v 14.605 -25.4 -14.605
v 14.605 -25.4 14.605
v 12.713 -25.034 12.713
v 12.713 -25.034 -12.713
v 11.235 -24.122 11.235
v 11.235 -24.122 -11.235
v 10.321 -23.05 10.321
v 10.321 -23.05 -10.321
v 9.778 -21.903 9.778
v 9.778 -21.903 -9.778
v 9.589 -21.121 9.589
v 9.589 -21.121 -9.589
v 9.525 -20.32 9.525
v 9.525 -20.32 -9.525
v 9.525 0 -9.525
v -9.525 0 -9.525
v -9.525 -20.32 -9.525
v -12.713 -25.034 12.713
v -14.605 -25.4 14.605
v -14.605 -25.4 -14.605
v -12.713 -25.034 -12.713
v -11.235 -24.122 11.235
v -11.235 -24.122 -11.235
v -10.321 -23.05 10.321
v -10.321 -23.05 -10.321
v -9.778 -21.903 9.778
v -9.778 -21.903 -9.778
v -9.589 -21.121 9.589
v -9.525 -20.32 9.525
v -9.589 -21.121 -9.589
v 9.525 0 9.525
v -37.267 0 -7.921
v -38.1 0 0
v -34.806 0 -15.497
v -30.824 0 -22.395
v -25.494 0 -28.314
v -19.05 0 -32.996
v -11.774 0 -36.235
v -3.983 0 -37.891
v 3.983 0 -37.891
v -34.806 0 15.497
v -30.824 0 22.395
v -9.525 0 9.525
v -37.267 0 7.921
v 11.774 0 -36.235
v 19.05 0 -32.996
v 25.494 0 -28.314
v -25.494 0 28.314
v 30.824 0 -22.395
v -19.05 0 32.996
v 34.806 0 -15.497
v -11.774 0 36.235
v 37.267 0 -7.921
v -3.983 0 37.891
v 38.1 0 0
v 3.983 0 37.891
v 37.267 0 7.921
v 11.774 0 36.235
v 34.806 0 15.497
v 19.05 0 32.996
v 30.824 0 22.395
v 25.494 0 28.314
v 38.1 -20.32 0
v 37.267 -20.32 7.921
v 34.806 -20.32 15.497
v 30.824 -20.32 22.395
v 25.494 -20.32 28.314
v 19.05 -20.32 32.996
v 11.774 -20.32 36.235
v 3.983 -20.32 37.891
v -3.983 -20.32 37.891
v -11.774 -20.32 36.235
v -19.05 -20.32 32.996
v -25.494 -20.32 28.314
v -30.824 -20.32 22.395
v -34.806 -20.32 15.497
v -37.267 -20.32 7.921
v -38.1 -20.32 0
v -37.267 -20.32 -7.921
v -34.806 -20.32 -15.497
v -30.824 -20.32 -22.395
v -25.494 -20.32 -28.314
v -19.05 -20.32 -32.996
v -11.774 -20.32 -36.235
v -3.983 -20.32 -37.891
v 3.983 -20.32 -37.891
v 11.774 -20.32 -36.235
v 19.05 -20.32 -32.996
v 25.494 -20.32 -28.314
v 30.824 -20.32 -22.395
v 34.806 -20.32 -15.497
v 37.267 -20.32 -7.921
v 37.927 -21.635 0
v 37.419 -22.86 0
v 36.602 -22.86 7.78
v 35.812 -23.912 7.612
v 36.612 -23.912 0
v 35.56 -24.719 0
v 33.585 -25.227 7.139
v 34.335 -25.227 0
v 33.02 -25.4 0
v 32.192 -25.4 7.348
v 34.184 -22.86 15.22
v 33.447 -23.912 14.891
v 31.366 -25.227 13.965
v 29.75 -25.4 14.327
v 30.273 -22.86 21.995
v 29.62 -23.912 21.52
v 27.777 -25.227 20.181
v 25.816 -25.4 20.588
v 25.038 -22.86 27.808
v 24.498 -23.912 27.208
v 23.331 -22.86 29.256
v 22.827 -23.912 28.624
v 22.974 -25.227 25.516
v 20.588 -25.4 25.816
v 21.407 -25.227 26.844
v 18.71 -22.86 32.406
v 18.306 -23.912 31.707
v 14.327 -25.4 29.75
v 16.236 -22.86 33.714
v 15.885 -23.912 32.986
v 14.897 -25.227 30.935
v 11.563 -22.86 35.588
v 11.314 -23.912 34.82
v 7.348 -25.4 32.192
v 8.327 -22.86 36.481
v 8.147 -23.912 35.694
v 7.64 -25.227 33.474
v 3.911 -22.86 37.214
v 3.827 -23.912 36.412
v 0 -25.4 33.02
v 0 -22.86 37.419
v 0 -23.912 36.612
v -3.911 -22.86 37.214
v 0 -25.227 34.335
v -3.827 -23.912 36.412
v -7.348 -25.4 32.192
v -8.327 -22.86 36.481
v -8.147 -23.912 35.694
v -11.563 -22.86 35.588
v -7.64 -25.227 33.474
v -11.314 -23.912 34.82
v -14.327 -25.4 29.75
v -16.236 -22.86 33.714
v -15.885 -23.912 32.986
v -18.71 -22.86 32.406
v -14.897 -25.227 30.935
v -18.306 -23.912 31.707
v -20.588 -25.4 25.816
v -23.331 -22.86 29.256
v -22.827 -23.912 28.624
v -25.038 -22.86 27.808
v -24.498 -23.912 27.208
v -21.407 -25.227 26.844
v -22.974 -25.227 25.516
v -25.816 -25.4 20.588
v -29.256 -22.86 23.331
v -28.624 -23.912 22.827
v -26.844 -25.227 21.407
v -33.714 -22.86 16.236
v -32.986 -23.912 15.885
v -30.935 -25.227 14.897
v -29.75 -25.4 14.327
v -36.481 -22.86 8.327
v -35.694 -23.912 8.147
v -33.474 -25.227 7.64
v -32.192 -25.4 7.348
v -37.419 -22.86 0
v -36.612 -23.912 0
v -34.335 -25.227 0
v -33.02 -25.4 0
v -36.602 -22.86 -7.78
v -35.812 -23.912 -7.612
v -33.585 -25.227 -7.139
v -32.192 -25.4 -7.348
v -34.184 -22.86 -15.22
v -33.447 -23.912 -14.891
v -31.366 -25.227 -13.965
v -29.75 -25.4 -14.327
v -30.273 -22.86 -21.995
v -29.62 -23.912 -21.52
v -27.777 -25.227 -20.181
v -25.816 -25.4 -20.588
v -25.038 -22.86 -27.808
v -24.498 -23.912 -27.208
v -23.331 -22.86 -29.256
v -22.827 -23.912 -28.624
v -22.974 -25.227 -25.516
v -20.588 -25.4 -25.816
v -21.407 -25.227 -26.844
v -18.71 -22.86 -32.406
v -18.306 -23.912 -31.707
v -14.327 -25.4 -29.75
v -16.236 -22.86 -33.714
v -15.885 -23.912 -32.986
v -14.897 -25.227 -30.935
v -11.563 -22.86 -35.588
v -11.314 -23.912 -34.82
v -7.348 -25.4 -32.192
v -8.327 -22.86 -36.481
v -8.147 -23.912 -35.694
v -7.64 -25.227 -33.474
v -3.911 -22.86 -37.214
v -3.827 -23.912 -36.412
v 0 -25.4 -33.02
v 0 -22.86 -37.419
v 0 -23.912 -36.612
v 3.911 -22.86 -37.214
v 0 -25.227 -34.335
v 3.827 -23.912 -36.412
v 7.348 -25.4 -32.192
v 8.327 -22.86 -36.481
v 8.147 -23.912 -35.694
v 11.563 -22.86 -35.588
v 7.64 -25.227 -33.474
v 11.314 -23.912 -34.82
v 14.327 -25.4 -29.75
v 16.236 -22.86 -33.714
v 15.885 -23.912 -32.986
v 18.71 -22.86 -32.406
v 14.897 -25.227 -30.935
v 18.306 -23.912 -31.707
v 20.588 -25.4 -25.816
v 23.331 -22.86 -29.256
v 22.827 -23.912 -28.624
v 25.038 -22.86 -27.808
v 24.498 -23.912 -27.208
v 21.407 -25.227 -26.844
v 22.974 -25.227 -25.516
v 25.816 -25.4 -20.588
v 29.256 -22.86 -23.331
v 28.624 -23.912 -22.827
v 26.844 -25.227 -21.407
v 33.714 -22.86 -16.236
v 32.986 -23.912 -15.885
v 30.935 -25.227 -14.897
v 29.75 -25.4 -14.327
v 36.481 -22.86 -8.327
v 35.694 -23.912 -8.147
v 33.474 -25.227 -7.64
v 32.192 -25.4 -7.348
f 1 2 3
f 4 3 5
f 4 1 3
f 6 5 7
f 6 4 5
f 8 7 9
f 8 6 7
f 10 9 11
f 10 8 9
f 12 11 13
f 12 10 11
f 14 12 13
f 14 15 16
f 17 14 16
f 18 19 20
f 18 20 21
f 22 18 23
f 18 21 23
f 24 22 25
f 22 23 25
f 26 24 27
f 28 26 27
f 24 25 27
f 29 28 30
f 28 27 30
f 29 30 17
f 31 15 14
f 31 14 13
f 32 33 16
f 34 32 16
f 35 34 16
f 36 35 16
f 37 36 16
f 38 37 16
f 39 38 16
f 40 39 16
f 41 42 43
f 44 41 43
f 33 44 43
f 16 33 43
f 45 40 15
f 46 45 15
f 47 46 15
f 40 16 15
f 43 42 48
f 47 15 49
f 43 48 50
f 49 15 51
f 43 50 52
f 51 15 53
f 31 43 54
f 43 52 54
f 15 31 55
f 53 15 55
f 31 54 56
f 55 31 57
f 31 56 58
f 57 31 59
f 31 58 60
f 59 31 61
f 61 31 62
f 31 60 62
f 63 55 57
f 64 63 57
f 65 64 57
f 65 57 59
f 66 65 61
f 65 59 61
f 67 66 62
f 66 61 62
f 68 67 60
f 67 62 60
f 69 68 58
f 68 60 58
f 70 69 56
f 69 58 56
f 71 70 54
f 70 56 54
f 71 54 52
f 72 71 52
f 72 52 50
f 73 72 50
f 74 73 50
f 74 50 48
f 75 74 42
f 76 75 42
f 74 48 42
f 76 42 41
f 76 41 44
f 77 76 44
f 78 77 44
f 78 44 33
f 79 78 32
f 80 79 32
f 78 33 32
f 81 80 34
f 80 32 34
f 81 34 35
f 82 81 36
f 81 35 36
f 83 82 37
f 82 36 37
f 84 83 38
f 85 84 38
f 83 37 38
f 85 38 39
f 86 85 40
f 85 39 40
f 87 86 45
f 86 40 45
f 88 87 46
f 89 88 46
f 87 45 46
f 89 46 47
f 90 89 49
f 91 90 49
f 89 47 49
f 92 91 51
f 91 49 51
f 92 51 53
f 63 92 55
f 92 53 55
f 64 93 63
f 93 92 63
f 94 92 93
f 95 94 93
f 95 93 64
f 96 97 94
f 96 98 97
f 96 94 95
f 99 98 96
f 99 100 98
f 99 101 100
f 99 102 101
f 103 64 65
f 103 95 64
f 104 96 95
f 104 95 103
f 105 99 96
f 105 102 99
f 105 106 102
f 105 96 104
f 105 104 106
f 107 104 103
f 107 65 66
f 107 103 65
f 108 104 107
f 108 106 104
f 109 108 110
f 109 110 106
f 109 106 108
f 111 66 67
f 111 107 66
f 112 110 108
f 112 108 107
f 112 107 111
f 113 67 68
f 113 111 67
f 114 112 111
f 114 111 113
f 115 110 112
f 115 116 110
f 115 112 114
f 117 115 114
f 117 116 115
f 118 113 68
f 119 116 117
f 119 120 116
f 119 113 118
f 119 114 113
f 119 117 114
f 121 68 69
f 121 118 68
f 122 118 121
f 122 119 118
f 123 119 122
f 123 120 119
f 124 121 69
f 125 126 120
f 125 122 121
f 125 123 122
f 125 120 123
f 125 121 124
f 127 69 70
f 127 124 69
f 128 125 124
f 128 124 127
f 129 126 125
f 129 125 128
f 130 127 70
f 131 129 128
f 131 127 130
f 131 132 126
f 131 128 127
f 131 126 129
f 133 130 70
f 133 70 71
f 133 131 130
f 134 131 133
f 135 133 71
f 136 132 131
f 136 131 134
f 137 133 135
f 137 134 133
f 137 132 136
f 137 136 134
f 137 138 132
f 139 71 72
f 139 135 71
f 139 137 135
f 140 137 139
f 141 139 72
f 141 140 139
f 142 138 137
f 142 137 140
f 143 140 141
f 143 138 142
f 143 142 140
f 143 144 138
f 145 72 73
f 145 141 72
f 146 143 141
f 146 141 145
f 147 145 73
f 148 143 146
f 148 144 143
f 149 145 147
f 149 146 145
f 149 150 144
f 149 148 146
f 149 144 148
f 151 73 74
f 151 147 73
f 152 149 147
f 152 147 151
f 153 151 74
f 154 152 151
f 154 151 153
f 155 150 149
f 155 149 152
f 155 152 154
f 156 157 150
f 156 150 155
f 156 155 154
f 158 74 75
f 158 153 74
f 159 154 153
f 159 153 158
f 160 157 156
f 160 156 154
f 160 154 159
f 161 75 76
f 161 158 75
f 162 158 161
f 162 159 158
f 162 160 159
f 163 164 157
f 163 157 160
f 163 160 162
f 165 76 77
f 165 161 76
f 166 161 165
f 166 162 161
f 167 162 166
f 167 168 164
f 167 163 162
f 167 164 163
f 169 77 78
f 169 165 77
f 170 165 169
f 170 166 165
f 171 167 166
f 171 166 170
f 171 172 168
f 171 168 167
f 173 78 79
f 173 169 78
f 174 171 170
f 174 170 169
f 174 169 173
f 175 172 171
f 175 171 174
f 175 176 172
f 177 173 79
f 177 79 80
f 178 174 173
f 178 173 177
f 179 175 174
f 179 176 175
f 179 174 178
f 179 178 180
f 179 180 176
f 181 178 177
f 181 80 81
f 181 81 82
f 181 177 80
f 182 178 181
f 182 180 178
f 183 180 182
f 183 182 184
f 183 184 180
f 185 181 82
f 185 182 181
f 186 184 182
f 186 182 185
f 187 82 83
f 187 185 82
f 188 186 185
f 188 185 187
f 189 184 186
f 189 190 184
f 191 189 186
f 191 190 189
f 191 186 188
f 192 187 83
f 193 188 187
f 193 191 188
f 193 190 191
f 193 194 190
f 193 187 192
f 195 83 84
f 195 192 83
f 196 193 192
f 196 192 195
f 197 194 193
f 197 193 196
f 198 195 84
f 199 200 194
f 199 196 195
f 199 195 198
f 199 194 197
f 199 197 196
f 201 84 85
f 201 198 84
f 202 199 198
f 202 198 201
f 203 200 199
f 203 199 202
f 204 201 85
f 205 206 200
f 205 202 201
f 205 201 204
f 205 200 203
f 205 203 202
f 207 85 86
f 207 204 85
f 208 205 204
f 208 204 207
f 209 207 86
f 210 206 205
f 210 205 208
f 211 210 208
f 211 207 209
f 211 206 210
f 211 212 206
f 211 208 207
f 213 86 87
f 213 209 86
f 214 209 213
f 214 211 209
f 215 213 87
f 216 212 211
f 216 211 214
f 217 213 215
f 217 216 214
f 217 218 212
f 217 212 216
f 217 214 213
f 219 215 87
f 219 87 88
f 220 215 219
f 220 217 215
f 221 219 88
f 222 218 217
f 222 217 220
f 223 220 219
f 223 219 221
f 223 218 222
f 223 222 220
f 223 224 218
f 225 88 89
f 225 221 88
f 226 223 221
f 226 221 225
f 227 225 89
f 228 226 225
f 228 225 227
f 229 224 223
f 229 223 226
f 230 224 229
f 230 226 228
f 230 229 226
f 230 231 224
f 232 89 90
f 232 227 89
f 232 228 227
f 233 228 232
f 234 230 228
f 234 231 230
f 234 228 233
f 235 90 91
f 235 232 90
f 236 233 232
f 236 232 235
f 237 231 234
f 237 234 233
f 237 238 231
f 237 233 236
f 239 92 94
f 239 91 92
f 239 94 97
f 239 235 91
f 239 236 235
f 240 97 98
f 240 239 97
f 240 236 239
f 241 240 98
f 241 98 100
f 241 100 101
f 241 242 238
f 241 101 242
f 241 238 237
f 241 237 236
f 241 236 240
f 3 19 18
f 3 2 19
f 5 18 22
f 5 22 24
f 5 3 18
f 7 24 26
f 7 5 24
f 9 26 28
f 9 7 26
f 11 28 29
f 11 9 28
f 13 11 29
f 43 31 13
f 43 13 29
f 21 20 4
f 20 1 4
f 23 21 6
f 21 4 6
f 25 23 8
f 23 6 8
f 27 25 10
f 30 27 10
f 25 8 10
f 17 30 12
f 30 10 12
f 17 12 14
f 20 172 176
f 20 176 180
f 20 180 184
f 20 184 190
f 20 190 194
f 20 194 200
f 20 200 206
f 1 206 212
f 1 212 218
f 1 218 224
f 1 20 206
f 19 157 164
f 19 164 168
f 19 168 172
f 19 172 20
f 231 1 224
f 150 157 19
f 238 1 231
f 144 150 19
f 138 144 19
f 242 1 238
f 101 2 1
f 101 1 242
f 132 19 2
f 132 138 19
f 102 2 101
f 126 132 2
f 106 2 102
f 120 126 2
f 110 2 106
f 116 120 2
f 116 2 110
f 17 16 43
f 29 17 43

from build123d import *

# Parameters (mm, degrees)
F0_R     = 38.1
F1_DEPTH = 25.4
F2_R     = 5.08
F3_W     = 19.05
F3_H     = 19.05
F4_DEPTH = 25.401
F5_R     = 5.08


with BuildPart() as f1:
    # F0 (on Front) → F1 (new body)
    with BuildSketch(Plane.XZ):
        Circle(F0_R)
    extrude(amount=F1_DEPTH)

    # F2
    f2_edges = [f1.edges().sort_by_distance(p)[0] for p in [
        (-38.1, -25.4, 0),
    ]]
    fillet(f2_edges, radius=F2_R)

    # F3 (on face) → F4 (cut, through all)
    with BuildSketch(Plane(origin=(0, 0, 0), x_dir=(-1, 0, 0), z_dir=(0, 1, 0))):
        Rectangle(F3_W, F3_H)
    extrude(amount=-F4_DEPTH, mode=Mode.SUBTRACT)

    # F5
    f5_edges = [f1.edges().sort_by_distance(p)[0] for p in [
        (0, -25.4, 9.525),
        (-9.525, -25.4, 0),
        (0, -25.4, -9.525),
        (9.525, -25.4, 0),
    ]]
    fillet(f5_edges, radius=F5_R)


solid = f1.part
